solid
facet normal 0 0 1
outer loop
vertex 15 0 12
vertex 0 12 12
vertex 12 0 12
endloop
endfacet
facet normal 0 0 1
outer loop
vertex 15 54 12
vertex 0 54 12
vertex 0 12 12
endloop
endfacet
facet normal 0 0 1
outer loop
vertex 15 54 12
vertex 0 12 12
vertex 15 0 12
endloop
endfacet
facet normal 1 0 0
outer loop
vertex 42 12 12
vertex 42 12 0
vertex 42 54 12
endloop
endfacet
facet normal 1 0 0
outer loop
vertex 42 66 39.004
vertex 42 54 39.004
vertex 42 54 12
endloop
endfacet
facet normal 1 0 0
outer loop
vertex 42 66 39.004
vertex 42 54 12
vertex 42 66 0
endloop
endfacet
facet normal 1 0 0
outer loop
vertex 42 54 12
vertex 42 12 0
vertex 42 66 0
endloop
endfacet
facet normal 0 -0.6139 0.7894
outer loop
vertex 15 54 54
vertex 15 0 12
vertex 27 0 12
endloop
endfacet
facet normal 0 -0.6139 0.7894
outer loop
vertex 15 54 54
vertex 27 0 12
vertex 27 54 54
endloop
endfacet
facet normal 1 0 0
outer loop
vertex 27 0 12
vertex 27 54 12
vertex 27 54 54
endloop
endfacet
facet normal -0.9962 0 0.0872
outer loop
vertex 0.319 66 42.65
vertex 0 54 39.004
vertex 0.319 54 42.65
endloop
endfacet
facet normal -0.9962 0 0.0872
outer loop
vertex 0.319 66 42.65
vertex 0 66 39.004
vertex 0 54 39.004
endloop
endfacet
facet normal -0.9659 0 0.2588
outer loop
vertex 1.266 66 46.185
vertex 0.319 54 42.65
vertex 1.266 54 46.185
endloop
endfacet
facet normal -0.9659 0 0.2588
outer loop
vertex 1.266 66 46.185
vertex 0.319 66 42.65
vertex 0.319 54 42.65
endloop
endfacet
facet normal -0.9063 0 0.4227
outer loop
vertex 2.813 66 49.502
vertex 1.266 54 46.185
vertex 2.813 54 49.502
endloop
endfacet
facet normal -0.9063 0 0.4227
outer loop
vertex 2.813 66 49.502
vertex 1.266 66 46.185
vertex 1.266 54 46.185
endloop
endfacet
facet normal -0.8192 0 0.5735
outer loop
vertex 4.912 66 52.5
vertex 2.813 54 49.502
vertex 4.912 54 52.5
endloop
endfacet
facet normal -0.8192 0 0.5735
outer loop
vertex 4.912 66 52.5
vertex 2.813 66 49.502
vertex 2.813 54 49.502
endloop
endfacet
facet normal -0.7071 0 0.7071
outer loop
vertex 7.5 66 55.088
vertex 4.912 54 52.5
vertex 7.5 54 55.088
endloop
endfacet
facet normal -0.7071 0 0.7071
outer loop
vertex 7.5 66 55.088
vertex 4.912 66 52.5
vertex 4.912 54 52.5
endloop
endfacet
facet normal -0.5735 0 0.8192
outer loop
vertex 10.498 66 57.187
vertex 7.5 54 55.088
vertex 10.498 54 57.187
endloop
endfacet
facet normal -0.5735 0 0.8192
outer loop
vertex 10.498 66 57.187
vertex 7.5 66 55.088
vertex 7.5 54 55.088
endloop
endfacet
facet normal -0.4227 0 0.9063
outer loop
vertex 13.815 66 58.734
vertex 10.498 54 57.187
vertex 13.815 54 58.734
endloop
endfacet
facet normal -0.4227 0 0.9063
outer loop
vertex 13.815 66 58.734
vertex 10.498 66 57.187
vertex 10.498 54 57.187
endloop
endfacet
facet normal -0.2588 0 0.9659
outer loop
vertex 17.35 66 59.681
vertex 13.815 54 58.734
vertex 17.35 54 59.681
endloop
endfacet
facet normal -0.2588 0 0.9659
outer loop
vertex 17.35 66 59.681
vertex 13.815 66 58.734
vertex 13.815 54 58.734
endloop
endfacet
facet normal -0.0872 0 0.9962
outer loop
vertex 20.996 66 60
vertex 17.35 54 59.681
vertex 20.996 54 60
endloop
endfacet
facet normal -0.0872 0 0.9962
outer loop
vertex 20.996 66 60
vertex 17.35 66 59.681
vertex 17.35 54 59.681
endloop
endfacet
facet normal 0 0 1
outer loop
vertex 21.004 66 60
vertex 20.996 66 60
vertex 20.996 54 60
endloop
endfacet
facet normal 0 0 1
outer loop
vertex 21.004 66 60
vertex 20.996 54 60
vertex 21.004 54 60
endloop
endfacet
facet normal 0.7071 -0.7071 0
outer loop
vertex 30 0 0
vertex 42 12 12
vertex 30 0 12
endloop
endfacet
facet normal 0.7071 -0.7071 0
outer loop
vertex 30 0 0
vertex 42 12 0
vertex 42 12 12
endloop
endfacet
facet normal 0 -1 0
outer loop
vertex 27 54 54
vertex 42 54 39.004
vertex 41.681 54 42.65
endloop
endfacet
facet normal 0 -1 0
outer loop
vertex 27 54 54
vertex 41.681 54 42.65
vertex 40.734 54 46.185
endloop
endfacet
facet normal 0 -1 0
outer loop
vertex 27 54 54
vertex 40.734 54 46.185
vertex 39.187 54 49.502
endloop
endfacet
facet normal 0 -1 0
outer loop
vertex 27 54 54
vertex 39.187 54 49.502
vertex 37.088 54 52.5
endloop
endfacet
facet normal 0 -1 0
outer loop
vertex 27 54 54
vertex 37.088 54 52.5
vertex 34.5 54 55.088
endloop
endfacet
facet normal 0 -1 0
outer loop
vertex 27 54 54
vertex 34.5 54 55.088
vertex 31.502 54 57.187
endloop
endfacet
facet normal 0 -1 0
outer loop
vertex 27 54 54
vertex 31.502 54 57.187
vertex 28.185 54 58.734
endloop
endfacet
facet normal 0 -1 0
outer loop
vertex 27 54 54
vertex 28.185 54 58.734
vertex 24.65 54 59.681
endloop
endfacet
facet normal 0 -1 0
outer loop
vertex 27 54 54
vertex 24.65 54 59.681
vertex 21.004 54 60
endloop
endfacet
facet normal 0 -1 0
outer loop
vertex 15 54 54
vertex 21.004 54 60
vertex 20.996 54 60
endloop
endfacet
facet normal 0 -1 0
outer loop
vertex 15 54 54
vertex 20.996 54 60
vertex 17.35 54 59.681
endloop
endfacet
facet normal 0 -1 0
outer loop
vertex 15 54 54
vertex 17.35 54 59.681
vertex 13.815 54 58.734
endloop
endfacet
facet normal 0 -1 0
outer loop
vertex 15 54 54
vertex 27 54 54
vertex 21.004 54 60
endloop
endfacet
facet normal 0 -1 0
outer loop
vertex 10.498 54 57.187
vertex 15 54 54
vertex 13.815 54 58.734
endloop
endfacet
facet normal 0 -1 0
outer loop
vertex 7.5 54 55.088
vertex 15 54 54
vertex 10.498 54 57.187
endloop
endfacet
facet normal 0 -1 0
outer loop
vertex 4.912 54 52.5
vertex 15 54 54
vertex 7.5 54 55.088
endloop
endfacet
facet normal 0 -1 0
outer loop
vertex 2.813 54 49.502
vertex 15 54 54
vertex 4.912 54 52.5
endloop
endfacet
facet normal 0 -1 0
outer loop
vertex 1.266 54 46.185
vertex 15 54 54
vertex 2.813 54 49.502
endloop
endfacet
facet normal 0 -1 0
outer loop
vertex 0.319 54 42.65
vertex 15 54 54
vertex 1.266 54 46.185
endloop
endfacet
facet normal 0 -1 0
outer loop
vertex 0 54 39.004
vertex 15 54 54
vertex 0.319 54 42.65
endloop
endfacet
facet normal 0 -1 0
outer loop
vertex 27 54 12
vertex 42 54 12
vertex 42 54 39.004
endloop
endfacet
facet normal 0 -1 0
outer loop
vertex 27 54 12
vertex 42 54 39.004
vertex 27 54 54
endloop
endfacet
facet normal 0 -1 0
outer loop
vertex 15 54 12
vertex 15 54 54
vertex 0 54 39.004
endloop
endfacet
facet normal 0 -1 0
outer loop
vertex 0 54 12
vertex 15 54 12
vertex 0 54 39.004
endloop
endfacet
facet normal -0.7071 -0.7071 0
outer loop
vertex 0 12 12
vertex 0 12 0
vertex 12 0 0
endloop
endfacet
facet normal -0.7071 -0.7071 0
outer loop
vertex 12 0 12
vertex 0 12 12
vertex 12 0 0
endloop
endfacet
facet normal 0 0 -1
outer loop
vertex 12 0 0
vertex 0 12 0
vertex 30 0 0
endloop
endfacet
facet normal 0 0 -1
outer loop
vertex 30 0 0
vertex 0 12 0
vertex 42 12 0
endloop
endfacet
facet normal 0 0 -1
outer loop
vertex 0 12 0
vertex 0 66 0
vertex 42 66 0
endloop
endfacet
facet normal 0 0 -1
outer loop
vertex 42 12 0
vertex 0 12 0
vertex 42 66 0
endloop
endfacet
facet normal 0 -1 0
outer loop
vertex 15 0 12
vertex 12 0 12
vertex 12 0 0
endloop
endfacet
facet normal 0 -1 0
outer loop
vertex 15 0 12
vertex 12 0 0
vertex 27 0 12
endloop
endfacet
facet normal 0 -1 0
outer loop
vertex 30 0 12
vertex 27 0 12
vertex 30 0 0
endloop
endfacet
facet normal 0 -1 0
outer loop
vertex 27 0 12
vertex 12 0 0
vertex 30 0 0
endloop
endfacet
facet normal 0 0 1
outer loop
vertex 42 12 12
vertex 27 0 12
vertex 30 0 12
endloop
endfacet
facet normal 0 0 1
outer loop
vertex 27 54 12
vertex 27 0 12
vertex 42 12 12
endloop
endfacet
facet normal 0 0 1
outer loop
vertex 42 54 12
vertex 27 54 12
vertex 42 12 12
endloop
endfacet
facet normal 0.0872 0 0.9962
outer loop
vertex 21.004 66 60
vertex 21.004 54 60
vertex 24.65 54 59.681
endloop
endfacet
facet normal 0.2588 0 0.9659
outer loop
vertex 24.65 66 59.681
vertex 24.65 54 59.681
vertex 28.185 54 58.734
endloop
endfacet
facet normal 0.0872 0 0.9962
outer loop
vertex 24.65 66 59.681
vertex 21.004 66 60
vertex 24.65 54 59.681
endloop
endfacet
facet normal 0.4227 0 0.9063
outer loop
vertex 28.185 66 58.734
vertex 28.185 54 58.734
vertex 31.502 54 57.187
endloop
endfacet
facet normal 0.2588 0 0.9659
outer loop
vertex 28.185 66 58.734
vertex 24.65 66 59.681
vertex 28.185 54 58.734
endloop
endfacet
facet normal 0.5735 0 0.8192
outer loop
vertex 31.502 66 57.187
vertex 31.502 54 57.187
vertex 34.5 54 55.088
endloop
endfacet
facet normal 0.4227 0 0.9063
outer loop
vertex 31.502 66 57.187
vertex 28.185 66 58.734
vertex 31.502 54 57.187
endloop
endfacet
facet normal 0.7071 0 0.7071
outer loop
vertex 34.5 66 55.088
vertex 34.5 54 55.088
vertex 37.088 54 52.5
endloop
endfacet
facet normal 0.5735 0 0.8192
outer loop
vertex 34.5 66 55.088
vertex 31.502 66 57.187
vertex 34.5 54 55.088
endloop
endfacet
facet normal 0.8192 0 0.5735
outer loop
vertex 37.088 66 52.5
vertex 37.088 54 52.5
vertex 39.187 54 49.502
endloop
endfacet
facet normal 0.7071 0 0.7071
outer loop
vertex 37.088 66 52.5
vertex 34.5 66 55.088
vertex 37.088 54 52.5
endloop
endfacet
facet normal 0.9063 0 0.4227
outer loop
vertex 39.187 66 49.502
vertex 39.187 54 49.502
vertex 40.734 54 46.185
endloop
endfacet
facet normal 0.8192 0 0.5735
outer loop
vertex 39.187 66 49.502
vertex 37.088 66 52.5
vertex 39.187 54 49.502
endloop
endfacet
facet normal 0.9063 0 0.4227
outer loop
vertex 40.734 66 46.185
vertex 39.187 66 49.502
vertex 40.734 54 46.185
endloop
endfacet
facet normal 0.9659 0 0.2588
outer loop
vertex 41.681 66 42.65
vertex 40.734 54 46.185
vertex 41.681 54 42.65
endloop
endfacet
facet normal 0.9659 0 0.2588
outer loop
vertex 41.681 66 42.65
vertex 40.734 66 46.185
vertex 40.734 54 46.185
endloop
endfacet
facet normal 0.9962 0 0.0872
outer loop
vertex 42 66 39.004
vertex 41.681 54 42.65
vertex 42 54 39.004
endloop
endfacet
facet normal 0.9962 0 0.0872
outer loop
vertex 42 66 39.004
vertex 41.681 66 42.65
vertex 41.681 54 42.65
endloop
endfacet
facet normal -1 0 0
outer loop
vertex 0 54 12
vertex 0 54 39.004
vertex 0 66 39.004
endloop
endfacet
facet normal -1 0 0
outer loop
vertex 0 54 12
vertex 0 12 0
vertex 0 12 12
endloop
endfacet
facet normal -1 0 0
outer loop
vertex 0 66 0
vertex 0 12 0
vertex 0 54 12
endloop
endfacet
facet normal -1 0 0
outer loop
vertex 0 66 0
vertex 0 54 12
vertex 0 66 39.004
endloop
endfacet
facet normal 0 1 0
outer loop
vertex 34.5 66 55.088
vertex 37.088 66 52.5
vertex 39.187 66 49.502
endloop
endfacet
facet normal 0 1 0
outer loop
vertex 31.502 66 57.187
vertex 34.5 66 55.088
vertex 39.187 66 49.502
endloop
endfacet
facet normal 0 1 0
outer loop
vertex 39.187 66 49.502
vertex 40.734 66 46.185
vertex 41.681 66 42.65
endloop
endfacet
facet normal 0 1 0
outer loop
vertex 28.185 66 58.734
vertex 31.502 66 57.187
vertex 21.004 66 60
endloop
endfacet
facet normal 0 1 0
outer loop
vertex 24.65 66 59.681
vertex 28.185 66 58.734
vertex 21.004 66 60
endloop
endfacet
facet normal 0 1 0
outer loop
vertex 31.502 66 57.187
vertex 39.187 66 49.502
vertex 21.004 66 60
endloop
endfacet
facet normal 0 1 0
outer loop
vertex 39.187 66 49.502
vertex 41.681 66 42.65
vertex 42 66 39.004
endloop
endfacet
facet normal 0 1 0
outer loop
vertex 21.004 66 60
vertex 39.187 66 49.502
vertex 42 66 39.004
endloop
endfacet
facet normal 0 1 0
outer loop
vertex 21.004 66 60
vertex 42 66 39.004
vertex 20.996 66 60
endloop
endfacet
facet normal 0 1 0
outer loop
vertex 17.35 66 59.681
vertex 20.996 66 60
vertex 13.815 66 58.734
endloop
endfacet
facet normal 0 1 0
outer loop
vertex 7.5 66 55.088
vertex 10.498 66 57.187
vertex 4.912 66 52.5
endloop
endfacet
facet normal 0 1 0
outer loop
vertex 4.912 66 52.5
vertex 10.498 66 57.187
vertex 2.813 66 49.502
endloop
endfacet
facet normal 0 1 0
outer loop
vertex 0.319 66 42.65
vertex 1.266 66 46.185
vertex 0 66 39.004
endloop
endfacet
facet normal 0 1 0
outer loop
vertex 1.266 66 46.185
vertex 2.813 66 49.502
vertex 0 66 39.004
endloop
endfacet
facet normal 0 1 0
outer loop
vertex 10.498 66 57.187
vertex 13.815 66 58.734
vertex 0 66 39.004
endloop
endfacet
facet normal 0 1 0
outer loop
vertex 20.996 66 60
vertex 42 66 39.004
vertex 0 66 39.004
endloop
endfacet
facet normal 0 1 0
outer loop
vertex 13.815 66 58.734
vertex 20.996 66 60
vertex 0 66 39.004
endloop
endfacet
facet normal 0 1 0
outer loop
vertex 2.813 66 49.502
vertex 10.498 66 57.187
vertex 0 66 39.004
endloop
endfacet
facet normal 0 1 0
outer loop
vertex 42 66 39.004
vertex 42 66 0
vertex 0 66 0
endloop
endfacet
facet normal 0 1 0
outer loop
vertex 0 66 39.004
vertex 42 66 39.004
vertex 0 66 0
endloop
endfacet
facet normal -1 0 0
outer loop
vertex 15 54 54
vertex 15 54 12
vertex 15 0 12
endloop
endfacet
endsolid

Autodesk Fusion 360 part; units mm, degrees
sketch "top view" plane through (0, 0, 0) normal (0, 0, 1) x (1, 0, 0)
  line L0 (12.0004, 0) -> (29.9996, 0)
  line L1 (42, 12) -> (42, 66)
  line L2 (42, 66) -> (0, 66)
  line L3 (0, 66) -> (0, 0) construction
  line L4 (21, 66) -> (21, 0) construction
  line L5 (0, 66) -> (15, 66)
  line L6 (15, 54) -> (15, 0)
  line L7 (15, 0) -> (12.0004, 0) construction
  line L8 (0, 12) -> (0, 66)
  line L9 (27, 54) -> (27, 0)
  line L10 (0, 0) -> (12.0004, 0) construction
  line L11 (12.0004, 0) -> (12.0004, 12) construction
  line L12 (12.0004, 12) -> (0, 12) construction
  line L13 (0, 12) -> (0, 0) construction
  line L14 (0, 12) -> (12.0004, 0)
  line L15 (29.9996, 12) -> (42, 12) construction
  line L16 (29.9996, 0) -> (29.9996, 12) construction
  line L17 (42, 12) -> (29.9996, 0)
  line L18 (42, 12) -> (42, 0) construction
  line L19 (42, 0) -> (29.9996, 0) construction
  line L20 (0, 66) -> (42, 66)
  line L21 (42, 66) -> (42, 54)
  line L22 (42, 54) -> (0, 54)
  line L23 (0, 54) -> (0, 66)
  line L24 (15, 66) -> (15, 54) construction
  line L25 (27, 54) -> (27, 66) construction
  dimension "d1" = 66
  dimension "d3" = 12
  dimension "d4" = 12
extrude "Extrude1" add sketch "top view" along normal blind 12
extrude "Extrude2" add sketch "top view" along normal blind 60 contours L1 L2 L5 L8 L20 L21 L22 L23
fillet "Fillet1" radius 21 2 edges at (0, 60, 60) (42, 60, 60)
extrude "Extrude3" add sketch "top view" along normal blind 54 contours L0 L6 L9 L22
sketch "middle part side view" plane through (0, 0, 0) normal (1, 0, 0) x (0, 1, 0)
  line L0 (0, 12) -> (54, 54)
  line L1 (54, 54) -> (54, 12)
  line L2 (54, 12) -> (0, 12)
  line L3 (0, 54) -> (0, 12)
  line L4 (54, 54) -> (0, 54)
extrude "Extrude4" cut sketch "middle part side view" along normal blind 45 contours L0 L3 L4
